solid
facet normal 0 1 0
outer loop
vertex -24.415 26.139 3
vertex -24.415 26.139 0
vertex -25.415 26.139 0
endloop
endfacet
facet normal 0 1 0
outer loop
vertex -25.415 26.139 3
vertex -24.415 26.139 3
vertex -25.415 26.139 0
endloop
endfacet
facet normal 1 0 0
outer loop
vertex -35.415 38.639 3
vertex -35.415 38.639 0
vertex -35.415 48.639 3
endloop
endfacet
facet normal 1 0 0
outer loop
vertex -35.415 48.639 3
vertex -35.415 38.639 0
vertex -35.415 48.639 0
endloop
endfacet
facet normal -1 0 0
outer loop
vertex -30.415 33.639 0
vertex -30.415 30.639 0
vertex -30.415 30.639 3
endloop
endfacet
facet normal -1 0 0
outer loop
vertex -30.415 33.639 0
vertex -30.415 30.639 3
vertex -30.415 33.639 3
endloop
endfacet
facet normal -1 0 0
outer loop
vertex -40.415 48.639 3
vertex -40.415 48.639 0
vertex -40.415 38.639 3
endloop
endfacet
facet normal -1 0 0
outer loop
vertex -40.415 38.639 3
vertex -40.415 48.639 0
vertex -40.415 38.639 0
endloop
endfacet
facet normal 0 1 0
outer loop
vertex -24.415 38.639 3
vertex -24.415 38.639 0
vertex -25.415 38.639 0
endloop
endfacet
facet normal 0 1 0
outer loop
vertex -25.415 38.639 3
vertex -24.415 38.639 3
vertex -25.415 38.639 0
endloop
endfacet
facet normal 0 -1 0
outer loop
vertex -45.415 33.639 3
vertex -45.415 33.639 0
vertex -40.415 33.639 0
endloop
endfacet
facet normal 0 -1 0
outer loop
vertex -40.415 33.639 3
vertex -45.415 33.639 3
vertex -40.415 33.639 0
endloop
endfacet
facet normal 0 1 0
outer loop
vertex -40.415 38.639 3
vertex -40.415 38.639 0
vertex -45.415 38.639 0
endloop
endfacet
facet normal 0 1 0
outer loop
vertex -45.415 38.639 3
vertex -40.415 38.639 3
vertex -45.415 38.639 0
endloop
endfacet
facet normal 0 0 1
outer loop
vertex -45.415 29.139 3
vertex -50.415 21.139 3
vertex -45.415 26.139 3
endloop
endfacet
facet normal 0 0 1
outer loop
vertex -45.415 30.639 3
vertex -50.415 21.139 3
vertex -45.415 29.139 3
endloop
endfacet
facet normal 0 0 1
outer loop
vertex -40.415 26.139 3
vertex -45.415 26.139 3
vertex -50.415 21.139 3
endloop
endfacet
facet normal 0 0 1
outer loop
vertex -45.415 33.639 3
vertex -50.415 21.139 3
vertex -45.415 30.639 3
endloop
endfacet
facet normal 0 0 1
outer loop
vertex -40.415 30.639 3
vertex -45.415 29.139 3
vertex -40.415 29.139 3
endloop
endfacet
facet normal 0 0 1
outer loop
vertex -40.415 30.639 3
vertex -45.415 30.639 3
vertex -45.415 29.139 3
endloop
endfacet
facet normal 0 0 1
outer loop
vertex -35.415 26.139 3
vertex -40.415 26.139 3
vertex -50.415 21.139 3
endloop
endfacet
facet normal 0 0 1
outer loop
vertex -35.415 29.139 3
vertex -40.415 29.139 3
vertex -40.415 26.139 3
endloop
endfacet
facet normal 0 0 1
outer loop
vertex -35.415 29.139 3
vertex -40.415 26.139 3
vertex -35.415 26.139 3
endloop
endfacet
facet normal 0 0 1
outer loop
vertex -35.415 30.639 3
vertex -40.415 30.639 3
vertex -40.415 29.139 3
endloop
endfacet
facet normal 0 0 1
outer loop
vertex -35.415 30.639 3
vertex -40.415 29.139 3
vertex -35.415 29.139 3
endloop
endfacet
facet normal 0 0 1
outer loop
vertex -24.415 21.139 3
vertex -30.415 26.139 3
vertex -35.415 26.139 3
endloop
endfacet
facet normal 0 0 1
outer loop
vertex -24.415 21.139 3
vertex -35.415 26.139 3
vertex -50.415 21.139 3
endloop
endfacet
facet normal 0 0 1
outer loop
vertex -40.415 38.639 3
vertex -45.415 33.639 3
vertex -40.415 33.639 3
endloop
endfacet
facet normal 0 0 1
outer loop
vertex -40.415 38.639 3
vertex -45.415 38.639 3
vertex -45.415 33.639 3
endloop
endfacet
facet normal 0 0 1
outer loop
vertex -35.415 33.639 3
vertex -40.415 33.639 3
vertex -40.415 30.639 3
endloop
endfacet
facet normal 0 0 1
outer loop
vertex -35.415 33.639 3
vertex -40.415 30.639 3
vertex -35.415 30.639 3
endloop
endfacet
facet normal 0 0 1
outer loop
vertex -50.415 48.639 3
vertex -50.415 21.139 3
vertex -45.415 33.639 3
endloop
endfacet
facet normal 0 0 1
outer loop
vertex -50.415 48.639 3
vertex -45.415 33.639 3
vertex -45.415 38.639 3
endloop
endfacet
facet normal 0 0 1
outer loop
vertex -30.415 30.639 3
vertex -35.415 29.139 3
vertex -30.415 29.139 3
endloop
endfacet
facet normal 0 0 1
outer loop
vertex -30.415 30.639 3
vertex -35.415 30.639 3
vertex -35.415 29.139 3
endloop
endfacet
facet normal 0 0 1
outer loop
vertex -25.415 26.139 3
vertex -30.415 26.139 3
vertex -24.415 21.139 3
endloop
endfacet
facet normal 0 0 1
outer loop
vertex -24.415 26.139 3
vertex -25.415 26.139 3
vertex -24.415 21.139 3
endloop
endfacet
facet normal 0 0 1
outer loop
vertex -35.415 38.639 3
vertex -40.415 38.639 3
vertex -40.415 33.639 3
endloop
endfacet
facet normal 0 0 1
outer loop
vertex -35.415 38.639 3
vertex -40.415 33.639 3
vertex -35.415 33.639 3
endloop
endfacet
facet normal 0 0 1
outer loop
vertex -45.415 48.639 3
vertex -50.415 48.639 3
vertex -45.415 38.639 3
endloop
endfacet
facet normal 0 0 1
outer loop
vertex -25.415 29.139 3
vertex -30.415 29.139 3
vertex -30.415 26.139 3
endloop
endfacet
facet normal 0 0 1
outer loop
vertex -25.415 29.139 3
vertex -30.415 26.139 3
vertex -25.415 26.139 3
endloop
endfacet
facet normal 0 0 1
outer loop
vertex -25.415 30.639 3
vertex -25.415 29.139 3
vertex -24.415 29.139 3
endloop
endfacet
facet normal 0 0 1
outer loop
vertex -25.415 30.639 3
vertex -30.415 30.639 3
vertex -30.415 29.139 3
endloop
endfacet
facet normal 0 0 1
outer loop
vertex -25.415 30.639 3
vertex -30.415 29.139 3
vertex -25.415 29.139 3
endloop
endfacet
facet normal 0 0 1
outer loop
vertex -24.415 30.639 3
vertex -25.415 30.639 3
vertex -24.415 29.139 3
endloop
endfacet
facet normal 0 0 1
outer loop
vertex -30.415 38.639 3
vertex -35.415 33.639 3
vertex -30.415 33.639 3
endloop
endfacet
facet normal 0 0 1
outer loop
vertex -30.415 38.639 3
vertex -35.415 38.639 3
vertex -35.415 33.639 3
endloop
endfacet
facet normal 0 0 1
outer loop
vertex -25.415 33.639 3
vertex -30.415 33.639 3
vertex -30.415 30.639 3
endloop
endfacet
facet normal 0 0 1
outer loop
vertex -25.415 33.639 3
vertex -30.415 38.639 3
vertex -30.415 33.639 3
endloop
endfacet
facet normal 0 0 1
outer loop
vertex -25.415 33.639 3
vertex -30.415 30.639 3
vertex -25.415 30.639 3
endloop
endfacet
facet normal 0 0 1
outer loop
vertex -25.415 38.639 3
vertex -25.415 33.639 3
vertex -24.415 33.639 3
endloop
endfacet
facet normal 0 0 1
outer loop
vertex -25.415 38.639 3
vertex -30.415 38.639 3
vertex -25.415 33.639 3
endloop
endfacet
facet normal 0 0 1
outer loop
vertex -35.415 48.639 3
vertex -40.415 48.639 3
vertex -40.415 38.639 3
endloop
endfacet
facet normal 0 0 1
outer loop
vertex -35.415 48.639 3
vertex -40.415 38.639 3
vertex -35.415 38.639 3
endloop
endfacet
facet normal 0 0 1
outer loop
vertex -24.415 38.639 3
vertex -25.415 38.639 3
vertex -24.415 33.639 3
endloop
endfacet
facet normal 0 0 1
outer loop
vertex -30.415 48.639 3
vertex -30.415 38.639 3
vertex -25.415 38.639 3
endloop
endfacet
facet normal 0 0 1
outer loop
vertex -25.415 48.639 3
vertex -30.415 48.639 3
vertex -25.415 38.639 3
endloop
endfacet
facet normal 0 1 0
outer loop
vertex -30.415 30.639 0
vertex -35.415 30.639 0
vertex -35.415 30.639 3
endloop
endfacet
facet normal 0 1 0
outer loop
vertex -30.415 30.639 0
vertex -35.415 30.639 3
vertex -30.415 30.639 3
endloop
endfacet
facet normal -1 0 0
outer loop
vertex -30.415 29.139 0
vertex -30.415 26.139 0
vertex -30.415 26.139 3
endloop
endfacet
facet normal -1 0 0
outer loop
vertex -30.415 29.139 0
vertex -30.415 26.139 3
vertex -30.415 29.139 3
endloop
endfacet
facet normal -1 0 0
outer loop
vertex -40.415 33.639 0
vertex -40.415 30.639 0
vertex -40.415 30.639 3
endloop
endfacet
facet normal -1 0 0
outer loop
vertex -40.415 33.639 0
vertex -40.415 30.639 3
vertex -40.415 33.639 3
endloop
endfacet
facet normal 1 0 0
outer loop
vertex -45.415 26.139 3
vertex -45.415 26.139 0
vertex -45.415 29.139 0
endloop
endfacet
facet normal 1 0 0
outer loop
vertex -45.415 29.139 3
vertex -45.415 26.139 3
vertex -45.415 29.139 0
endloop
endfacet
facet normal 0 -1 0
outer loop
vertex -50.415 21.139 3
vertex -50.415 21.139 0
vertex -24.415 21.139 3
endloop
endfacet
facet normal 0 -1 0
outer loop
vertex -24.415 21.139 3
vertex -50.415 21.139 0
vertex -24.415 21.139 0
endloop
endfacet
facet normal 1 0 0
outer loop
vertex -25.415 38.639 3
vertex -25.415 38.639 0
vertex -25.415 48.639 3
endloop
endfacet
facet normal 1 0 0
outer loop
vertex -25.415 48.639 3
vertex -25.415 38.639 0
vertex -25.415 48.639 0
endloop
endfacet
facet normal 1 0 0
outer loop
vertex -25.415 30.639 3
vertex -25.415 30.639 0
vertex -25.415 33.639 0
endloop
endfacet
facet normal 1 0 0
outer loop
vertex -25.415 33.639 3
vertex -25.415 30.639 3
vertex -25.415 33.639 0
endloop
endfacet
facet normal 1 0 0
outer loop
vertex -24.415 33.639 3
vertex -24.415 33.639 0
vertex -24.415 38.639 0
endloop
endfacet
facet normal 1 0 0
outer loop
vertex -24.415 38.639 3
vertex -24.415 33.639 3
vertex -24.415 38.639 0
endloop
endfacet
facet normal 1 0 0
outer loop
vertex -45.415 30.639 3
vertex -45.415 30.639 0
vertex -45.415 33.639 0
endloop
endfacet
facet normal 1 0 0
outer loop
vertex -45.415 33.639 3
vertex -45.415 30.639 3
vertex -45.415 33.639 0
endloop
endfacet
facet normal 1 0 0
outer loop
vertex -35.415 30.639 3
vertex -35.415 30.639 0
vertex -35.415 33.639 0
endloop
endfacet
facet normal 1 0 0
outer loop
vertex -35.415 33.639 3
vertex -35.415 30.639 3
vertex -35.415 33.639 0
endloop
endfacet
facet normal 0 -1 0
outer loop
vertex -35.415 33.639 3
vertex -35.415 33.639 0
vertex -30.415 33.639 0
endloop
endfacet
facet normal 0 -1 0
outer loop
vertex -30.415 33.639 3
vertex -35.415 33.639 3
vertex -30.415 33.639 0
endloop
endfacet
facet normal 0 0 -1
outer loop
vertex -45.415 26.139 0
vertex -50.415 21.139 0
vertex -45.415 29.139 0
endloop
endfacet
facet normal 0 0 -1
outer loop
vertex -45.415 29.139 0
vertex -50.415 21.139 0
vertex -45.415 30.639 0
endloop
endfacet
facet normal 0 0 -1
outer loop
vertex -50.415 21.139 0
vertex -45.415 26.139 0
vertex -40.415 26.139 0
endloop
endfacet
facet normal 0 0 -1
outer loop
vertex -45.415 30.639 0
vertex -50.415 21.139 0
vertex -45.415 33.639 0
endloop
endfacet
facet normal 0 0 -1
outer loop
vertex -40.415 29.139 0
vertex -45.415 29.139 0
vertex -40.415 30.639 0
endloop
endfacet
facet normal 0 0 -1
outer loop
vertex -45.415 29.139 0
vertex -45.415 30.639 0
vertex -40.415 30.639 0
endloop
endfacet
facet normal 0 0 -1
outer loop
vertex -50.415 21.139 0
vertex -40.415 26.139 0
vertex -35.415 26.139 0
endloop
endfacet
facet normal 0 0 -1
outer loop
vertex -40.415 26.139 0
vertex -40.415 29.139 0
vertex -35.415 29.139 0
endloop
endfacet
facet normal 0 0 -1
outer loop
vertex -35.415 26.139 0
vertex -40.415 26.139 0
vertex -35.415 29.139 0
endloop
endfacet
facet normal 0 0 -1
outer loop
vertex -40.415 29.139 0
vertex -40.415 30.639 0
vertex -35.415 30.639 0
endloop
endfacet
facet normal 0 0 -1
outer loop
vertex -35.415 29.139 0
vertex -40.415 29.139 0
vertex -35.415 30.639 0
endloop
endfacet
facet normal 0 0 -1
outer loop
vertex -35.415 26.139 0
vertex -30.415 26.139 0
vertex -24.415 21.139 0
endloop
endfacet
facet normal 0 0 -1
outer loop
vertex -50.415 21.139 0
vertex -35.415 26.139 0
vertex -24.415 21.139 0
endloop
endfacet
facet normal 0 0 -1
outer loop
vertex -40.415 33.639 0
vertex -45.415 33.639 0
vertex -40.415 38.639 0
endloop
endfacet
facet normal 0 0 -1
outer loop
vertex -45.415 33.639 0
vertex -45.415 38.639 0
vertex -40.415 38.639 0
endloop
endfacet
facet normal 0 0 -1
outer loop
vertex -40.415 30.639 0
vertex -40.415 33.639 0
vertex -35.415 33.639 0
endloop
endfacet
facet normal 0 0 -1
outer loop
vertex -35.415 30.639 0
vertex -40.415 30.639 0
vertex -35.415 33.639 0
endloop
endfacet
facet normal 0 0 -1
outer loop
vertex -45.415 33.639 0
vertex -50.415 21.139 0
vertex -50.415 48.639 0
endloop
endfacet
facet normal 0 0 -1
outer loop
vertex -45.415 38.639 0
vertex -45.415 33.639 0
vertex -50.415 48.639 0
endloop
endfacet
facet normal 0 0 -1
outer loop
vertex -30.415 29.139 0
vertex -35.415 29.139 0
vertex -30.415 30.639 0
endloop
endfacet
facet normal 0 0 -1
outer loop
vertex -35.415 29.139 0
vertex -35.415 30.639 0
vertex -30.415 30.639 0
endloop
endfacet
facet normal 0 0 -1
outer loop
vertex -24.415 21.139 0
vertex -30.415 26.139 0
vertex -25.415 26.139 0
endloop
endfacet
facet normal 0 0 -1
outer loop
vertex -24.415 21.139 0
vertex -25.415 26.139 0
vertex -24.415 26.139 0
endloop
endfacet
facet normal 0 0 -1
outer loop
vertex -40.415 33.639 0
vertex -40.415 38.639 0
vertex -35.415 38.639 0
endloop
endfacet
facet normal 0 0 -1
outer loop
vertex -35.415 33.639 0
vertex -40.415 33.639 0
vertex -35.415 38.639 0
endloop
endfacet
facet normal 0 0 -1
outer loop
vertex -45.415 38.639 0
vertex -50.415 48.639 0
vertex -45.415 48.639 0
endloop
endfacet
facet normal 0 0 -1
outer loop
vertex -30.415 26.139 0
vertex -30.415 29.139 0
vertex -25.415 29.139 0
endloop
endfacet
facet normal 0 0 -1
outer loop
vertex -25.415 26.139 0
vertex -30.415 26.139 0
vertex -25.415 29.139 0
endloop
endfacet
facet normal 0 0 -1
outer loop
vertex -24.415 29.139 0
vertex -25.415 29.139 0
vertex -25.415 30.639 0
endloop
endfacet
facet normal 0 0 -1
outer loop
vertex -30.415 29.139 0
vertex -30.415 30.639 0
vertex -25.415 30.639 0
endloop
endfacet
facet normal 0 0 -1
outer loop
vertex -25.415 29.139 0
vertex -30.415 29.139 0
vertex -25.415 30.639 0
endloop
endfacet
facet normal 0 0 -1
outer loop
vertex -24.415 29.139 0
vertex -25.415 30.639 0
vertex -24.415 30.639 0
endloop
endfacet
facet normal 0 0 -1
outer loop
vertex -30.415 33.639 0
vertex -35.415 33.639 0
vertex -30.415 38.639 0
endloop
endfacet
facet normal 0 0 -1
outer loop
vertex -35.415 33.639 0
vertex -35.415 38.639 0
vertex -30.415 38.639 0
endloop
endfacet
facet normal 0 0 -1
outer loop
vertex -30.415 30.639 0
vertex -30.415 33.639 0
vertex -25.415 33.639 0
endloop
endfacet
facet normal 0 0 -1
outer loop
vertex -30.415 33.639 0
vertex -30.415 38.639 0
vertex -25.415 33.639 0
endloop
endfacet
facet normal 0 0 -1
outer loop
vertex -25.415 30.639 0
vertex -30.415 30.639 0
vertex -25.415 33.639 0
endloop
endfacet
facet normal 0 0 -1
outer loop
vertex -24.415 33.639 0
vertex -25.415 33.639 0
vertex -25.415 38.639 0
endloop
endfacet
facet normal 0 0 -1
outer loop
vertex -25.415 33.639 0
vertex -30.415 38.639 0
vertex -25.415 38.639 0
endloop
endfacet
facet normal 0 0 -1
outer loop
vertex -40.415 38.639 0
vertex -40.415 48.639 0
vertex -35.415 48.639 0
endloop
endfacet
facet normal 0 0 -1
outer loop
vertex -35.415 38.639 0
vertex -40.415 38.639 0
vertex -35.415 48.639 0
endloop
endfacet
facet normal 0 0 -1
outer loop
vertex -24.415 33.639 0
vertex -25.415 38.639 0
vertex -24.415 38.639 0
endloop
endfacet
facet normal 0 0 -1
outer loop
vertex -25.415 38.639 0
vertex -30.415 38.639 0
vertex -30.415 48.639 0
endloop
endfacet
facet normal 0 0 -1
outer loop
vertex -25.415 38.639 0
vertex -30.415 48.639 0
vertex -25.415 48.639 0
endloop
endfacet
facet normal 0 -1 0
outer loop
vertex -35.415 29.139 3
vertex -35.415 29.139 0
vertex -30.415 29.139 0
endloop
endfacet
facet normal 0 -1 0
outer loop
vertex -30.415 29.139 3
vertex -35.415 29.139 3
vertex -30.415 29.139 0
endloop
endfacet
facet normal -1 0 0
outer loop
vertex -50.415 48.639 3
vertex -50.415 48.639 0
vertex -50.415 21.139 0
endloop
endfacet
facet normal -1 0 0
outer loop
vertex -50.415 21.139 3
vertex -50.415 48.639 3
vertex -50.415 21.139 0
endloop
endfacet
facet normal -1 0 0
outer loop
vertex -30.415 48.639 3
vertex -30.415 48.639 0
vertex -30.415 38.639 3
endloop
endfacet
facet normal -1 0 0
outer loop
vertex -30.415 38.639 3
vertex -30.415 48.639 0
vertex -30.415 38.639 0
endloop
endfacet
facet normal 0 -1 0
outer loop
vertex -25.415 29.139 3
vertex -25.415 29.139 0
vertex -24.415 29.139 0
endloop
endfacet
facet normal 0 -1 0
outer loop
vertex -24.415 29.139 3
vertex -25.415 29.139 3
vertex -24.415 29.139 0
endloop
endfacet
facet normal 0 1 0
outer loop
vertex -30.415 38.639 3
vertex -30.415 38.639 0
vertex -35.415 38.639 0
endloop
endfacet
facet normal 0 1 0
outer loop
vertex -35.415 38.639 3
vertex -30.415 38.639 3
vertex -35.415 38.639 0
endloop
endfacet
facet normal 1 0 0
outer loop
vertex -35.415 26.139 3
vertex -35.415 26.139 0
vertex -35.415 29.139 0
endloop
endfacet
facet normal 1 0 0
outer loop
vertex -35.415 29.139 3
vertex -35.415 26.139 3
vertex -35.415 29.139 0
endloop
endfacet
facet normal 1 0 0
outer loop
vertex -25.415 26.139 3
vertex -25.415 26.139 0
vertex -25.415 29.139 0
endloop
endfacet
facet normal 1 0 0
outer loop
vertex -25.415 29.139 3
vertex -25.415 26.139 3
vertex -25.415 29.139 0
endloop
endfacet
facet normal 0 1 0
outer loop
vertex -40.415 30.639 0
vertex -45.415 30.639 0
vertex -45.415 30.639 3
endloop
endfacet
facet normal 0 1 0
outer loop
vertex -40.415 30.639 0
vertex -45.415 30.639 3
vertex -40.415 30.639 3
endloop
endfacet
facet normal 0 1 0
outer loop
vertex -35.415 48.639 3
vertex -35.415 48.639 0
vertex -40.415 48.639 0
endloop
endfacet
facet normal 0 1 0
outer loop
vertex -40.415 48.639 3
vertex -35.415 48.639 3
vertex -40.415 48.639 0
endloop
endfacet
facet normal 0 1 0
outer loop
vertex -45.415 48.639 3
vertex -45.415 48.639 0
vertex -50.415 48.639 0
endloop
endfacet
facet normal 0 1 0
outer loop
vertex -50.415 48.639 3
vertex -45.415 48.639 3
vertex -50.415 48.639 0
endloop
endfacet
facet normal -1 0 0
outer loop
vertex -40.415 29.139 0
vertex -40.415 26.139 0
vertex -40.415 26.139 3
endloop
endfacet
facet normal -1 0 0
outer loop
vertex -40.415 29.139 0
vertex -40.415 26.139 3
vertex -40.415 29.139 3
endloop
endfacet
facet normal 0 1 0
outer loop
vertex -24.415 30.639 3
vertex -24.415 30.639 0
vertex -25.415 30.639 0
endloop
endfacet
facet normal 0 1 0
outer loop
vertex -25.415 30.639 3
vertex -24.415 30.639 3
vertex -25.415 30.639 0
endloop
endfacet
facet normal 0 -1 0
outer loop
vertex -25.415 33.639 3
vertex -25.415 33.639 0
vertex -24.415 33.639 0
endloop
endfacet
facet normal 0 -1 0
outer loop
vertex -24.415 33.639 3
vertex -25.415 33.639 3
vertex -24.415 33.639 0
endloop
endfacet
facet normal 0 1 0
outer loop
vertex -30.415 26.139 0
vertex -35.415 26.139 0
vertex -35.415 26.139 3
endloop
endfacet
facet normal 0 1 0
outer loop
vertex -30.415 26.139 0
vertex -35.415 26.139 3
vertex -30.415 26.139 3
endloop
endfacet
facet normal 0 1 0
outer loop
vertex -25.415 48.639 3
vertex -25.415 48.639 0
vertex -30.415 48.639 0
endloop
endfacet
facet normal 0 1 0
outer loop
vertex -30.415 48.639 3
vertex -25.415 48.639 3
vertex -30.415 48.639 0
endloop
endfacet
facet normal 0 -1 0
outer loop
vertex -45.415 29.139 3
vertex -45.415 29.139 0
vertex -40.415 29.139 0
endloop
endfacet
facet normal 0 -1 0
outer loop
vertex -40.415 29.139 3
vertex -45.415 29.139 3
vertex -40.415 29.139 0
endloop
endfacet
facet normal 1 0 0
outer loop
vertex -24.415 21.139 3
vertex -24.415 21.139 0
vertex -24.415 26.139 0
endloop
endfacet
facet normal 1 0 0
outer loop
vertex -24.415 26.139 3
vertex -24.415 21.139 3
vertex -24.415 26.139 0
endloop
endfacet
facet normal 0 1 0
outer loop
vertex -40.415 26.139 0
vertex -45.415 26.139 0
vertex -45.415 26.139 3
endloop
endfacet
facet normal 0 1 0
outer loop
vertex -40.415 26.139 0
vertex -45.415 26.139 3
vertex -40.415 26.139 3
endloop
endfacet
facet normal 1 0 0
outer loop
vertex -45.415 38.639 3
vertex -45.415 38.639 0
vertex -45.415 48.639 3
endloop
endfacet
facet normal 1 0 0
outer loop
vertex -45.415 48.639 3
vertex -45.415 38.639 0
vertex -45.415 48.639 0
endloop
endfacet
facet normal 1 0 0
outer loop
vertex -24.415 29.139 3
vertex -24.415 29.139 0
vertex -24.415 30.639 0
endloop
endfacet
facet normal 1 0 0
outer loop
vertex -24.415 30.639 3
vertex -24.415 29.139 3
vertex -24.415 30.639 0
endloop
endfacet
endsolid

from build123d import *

# Parameters (mm, degrees)
ESQUISSE1_W        = 5
ESQUISSE1_H        = 3
BOSS_EXTRU_1_DEPTH = 3


with BuildPart() as part:
    # Esquisse1 → Boss.-Extru.1 (new body)
    with BuildSketch(Plane.XY):
        Polygon((-40.414818772, 48.638632865), (-40.414818772, 38.638632865), (-45.414818772, 38.638632865), (-45.414818772, 48.638632865), (-50.414818772, 48.638632865), (-50.414818772, 21.138632865), (-24.414818772, 21.138632865), (-24.414818772, 26.138632865), (-25.414818772, 26.138632865), (-25.414818772, 29.138632865), (-24.414818772, 29.138632865), (-24.414818772, 30.638632865), (-25.414818772, 30.638632865), (-25.414818772, 33.638632865), (-24.414818772, 33.638632865), (-24.414818772, 38.638632865), (-25.414818772, 38.638632865), (-25.414818772, 48.638632865), (-30.414818772, 48.638632865), (-30.414818772, 38.638632865), (-35.414818772, 38.638632865), (-35.414818772, 48.638632865), align=None)
        with Locations((-32.914818772, 27.638632865)):
            Rectangle(ESQUISSE1_W, ESQUISSE1_H, mode=Mode.SUBTRACT)
        with Locations((-42.914818772, 27.638632865)):
            Rectangle(ESQUISSE1_W, ESQUISSE1_H, mode=Mode.SUBTRACT)
        with Locations((-32.914818772, 32.138632865)):
            Rectangle(ESQUISSE1_W, ESQUISSE1_H, mode=Mode.SUBTRACT)
        with Locations((-42.914818772, 32.138632865)):
            Rectangle(ESQUISSE1_W, ESQUISSE1_H, mode=Mode.SUBTRACT)
    extrude(amount=BOSS_EXTRU_1_DEPTH)


solid = part.part
